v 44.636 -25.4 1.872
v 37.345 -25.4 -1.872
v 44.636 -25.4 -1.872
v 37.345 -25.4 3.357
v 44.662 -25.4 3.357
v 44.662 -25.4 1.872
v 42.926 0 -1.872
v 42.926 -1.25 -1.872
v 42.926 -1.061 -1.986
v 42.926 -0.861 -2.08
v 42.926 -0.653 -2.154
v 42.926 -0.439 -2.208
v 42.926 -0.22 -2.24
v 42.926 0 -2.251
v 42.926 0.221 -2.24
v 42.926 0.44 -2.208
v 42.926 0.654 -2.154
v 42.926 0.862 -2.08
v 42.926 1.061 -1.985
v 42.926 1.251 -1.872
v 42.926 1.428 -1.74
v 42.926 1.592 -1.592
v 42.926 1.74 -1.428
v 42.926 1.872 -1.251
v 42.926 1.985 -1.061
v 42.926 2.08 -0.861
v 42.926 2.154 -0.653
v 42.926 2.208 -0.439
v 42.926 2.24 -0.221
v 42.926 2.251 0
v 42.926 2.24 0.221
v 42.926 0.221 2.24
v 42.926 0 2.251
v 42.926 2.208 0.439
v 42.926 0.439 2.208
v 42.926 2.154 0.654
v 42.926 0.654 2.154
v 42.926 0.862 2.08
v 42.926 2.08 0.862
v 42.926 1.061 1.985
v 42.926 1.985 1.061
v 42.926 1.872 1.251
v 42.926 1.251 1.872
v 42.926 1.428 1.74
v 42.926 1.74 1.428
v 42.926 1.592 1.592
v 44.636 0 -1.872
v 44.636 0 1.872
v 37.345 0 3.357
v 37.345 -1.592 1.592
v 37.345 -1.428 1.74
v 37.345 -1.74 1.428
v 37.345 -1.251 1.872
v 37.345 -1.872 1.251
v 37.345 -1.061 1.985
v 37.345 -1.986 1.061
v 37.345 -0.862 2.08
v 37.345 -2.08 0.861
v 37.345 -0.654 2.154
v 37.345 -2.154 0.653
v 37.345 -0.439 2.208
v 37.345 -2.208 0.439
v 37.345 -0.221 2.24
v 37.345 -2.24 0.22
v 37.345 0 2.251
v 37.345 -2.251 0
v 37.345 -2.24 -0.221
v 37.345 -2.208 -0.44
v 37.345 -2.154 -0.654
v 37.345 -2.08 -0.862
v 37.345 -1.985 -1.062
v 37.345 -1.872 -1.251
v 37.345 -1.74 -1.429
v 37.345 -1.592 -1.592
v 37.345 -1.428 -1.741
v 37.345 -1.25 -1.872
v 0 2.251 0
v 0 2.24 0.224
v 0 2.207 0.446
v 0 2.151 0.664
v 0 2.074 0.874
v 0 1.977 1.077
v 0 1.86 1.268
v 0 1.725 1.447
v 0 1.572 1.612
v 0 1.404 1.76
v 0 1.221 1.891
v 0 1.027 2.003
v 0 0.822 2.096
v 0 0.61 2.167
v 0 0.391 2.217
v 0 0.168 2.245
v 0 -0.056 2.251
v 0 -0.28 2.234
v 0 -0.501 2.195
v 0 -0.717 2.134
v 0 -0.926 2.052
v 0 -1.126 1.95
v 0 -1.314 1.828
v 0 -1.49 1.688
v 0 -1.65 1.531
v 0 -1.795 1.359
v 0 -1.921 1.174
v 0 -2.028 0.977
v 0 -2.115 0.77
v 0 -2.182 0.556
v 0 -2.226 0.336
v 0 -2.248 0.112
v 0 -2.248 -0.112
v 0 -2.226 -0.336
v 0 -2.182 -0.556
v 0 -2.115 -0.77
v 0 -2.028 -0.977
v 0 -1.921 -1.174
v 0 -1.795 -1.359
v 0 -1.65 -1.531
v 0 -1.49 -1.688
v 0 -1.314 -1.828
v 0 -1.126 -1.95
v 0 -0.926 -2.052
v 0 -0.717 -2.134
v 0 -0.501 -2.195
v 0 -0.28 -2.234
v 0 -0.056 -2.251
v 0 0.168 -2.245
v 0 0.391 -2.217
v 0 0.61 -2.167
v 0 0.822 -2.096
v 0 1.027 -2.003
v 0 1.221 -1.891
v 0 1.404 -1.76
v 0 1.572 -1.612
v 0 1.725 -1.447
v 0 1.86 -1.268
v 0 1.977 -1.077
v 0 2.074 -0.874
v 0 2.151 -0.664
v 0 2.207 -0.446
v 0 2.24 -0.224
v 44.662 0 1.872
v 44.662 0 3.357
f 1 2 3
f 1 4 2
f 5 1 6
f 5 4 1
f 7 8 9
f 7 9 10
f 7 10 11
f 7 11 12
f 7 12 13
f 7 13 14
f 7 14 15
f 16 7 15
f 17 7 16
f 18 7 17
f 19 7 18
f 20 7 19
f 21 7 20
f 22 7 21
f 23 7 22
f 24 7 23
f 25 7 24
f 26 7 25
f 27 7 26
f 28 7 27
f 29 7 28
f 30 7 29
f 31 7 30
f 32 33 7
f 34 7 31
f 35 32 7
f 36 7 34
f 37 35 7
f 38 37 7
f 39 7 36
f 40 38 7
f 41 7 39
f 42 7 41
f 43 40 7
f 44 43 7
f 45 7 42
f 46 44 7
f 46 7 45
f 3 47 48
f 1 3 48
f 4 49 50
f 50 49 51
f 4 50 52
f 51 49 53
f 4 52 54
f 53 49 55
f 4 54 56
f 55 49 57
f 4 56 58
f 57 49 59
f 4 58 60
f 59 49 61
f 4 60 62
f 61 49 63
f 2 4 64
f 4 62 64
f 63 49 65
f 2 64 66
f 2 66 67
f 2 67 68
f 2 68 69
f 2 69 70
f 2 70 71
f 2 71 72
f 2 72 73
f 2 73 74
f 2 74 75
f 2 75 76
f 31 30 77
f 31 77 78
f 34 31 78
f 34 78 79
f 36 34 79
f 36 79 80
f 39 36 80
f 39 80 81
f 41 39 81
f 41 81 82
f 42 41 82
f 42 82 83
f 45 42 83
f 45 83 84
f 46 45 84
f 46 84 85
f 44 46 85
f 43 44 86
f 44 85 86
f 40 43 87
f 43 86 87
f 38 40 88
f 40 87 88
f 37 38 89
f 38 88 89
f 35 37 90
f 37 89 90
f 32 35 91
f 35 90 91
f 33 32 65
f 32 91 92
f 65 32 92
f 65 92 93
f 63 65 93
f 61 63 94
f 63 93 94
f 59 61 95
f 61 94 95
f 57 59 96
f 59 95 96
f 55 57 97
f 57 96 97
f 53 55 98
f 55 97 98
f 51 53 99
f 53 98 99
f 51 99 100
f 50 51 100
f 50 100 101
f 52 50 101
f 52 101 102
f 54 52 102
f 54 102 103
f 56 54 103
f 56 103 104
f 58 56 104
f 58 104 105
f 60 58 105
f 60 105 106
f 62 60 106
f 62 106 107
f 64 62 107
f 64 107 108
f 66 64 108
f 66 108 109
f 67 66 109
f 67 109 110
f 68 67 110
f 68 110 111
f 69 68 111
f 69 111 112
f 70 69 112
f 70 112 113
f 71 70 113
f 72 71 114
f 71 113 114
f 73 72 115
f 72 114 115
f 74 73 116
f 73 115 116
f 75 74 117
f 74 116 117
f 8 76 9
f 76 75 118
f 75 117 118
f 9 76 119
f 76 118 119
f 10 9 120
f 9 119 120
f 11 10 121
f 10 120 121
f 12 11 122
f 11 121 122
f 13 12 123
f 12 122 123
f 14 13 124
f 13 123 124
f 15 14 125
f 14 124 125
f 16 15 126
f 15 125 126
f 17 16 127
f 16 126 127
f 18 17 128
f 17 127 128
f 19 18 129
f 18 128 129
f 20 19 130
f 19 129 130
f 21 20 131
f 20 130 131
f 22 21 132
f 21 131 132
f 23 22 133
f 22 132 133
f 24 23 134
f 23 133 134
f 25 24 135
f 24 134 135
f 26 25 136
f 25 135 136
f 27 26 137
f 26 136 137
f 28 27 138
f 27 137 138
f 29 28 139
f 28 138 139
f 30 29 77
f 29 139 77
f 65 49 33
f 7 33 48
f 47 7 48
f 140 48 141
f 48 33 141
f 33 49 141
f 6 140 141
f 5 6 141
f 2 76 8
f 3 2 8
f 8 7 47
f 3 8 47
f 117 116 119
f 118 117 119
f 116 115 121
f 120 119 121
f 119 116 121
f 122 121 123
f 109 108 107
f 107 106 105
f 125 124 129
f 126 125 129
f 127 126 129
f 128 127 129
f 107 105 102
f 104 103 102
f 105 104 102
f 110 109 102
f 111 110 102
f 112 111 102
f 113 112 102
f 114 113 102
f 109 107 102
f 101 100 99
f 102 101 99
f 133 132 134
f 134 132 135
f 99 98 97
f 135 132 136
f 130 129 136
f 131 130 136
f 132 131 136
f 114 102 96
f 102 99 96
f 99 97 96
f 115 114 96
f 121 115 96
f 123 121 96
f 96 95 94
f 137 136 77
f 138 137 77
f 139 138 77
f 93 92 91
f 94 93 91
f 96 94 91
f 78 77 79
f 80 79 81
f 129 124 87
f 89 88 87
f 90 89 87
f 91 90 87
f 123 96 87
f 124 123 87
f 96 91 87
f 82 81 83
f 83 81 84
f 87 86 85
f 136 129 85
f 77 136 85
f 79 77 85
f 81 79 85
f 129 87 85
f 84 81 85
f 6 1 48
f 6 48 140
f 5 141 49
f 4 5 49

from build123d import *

# Parameters (mm, degrees)
F1_R     = 2.251249
F2_DEPTH = 42.926
F3_DEPTH = 25.4


with BuildPart() as f2:
    # F1 (on Right) → F2 (new body)
    with BuildSketch(Plane.YZ):
        Circle(F1_R)
    extrude(amount=F2_DEPTH)

    # F0 (on Front) → F3 (join)
    with BuildSketch(Plane.XZ):
        Polygon((44.636123, 0), (41.285951, 0), (37.344571, 0), (37.344571, -1.872155), (44.636123, -1.872155), align=None)
        Polygon((37.344571, 0), (41.285951, 0), (44.636123, 0), (44.636123, 1.872155), (37.344571, 1.872155), align=None)
        Polygon((37.344571, 3.356544), (37.344571, 1.872155), (44.636123, 1.872155), (44.661563, 1.872155), (44.661563, 3.356544), align=None)
    extrude(amount=F3_DEPTH)


solid = f2.part
